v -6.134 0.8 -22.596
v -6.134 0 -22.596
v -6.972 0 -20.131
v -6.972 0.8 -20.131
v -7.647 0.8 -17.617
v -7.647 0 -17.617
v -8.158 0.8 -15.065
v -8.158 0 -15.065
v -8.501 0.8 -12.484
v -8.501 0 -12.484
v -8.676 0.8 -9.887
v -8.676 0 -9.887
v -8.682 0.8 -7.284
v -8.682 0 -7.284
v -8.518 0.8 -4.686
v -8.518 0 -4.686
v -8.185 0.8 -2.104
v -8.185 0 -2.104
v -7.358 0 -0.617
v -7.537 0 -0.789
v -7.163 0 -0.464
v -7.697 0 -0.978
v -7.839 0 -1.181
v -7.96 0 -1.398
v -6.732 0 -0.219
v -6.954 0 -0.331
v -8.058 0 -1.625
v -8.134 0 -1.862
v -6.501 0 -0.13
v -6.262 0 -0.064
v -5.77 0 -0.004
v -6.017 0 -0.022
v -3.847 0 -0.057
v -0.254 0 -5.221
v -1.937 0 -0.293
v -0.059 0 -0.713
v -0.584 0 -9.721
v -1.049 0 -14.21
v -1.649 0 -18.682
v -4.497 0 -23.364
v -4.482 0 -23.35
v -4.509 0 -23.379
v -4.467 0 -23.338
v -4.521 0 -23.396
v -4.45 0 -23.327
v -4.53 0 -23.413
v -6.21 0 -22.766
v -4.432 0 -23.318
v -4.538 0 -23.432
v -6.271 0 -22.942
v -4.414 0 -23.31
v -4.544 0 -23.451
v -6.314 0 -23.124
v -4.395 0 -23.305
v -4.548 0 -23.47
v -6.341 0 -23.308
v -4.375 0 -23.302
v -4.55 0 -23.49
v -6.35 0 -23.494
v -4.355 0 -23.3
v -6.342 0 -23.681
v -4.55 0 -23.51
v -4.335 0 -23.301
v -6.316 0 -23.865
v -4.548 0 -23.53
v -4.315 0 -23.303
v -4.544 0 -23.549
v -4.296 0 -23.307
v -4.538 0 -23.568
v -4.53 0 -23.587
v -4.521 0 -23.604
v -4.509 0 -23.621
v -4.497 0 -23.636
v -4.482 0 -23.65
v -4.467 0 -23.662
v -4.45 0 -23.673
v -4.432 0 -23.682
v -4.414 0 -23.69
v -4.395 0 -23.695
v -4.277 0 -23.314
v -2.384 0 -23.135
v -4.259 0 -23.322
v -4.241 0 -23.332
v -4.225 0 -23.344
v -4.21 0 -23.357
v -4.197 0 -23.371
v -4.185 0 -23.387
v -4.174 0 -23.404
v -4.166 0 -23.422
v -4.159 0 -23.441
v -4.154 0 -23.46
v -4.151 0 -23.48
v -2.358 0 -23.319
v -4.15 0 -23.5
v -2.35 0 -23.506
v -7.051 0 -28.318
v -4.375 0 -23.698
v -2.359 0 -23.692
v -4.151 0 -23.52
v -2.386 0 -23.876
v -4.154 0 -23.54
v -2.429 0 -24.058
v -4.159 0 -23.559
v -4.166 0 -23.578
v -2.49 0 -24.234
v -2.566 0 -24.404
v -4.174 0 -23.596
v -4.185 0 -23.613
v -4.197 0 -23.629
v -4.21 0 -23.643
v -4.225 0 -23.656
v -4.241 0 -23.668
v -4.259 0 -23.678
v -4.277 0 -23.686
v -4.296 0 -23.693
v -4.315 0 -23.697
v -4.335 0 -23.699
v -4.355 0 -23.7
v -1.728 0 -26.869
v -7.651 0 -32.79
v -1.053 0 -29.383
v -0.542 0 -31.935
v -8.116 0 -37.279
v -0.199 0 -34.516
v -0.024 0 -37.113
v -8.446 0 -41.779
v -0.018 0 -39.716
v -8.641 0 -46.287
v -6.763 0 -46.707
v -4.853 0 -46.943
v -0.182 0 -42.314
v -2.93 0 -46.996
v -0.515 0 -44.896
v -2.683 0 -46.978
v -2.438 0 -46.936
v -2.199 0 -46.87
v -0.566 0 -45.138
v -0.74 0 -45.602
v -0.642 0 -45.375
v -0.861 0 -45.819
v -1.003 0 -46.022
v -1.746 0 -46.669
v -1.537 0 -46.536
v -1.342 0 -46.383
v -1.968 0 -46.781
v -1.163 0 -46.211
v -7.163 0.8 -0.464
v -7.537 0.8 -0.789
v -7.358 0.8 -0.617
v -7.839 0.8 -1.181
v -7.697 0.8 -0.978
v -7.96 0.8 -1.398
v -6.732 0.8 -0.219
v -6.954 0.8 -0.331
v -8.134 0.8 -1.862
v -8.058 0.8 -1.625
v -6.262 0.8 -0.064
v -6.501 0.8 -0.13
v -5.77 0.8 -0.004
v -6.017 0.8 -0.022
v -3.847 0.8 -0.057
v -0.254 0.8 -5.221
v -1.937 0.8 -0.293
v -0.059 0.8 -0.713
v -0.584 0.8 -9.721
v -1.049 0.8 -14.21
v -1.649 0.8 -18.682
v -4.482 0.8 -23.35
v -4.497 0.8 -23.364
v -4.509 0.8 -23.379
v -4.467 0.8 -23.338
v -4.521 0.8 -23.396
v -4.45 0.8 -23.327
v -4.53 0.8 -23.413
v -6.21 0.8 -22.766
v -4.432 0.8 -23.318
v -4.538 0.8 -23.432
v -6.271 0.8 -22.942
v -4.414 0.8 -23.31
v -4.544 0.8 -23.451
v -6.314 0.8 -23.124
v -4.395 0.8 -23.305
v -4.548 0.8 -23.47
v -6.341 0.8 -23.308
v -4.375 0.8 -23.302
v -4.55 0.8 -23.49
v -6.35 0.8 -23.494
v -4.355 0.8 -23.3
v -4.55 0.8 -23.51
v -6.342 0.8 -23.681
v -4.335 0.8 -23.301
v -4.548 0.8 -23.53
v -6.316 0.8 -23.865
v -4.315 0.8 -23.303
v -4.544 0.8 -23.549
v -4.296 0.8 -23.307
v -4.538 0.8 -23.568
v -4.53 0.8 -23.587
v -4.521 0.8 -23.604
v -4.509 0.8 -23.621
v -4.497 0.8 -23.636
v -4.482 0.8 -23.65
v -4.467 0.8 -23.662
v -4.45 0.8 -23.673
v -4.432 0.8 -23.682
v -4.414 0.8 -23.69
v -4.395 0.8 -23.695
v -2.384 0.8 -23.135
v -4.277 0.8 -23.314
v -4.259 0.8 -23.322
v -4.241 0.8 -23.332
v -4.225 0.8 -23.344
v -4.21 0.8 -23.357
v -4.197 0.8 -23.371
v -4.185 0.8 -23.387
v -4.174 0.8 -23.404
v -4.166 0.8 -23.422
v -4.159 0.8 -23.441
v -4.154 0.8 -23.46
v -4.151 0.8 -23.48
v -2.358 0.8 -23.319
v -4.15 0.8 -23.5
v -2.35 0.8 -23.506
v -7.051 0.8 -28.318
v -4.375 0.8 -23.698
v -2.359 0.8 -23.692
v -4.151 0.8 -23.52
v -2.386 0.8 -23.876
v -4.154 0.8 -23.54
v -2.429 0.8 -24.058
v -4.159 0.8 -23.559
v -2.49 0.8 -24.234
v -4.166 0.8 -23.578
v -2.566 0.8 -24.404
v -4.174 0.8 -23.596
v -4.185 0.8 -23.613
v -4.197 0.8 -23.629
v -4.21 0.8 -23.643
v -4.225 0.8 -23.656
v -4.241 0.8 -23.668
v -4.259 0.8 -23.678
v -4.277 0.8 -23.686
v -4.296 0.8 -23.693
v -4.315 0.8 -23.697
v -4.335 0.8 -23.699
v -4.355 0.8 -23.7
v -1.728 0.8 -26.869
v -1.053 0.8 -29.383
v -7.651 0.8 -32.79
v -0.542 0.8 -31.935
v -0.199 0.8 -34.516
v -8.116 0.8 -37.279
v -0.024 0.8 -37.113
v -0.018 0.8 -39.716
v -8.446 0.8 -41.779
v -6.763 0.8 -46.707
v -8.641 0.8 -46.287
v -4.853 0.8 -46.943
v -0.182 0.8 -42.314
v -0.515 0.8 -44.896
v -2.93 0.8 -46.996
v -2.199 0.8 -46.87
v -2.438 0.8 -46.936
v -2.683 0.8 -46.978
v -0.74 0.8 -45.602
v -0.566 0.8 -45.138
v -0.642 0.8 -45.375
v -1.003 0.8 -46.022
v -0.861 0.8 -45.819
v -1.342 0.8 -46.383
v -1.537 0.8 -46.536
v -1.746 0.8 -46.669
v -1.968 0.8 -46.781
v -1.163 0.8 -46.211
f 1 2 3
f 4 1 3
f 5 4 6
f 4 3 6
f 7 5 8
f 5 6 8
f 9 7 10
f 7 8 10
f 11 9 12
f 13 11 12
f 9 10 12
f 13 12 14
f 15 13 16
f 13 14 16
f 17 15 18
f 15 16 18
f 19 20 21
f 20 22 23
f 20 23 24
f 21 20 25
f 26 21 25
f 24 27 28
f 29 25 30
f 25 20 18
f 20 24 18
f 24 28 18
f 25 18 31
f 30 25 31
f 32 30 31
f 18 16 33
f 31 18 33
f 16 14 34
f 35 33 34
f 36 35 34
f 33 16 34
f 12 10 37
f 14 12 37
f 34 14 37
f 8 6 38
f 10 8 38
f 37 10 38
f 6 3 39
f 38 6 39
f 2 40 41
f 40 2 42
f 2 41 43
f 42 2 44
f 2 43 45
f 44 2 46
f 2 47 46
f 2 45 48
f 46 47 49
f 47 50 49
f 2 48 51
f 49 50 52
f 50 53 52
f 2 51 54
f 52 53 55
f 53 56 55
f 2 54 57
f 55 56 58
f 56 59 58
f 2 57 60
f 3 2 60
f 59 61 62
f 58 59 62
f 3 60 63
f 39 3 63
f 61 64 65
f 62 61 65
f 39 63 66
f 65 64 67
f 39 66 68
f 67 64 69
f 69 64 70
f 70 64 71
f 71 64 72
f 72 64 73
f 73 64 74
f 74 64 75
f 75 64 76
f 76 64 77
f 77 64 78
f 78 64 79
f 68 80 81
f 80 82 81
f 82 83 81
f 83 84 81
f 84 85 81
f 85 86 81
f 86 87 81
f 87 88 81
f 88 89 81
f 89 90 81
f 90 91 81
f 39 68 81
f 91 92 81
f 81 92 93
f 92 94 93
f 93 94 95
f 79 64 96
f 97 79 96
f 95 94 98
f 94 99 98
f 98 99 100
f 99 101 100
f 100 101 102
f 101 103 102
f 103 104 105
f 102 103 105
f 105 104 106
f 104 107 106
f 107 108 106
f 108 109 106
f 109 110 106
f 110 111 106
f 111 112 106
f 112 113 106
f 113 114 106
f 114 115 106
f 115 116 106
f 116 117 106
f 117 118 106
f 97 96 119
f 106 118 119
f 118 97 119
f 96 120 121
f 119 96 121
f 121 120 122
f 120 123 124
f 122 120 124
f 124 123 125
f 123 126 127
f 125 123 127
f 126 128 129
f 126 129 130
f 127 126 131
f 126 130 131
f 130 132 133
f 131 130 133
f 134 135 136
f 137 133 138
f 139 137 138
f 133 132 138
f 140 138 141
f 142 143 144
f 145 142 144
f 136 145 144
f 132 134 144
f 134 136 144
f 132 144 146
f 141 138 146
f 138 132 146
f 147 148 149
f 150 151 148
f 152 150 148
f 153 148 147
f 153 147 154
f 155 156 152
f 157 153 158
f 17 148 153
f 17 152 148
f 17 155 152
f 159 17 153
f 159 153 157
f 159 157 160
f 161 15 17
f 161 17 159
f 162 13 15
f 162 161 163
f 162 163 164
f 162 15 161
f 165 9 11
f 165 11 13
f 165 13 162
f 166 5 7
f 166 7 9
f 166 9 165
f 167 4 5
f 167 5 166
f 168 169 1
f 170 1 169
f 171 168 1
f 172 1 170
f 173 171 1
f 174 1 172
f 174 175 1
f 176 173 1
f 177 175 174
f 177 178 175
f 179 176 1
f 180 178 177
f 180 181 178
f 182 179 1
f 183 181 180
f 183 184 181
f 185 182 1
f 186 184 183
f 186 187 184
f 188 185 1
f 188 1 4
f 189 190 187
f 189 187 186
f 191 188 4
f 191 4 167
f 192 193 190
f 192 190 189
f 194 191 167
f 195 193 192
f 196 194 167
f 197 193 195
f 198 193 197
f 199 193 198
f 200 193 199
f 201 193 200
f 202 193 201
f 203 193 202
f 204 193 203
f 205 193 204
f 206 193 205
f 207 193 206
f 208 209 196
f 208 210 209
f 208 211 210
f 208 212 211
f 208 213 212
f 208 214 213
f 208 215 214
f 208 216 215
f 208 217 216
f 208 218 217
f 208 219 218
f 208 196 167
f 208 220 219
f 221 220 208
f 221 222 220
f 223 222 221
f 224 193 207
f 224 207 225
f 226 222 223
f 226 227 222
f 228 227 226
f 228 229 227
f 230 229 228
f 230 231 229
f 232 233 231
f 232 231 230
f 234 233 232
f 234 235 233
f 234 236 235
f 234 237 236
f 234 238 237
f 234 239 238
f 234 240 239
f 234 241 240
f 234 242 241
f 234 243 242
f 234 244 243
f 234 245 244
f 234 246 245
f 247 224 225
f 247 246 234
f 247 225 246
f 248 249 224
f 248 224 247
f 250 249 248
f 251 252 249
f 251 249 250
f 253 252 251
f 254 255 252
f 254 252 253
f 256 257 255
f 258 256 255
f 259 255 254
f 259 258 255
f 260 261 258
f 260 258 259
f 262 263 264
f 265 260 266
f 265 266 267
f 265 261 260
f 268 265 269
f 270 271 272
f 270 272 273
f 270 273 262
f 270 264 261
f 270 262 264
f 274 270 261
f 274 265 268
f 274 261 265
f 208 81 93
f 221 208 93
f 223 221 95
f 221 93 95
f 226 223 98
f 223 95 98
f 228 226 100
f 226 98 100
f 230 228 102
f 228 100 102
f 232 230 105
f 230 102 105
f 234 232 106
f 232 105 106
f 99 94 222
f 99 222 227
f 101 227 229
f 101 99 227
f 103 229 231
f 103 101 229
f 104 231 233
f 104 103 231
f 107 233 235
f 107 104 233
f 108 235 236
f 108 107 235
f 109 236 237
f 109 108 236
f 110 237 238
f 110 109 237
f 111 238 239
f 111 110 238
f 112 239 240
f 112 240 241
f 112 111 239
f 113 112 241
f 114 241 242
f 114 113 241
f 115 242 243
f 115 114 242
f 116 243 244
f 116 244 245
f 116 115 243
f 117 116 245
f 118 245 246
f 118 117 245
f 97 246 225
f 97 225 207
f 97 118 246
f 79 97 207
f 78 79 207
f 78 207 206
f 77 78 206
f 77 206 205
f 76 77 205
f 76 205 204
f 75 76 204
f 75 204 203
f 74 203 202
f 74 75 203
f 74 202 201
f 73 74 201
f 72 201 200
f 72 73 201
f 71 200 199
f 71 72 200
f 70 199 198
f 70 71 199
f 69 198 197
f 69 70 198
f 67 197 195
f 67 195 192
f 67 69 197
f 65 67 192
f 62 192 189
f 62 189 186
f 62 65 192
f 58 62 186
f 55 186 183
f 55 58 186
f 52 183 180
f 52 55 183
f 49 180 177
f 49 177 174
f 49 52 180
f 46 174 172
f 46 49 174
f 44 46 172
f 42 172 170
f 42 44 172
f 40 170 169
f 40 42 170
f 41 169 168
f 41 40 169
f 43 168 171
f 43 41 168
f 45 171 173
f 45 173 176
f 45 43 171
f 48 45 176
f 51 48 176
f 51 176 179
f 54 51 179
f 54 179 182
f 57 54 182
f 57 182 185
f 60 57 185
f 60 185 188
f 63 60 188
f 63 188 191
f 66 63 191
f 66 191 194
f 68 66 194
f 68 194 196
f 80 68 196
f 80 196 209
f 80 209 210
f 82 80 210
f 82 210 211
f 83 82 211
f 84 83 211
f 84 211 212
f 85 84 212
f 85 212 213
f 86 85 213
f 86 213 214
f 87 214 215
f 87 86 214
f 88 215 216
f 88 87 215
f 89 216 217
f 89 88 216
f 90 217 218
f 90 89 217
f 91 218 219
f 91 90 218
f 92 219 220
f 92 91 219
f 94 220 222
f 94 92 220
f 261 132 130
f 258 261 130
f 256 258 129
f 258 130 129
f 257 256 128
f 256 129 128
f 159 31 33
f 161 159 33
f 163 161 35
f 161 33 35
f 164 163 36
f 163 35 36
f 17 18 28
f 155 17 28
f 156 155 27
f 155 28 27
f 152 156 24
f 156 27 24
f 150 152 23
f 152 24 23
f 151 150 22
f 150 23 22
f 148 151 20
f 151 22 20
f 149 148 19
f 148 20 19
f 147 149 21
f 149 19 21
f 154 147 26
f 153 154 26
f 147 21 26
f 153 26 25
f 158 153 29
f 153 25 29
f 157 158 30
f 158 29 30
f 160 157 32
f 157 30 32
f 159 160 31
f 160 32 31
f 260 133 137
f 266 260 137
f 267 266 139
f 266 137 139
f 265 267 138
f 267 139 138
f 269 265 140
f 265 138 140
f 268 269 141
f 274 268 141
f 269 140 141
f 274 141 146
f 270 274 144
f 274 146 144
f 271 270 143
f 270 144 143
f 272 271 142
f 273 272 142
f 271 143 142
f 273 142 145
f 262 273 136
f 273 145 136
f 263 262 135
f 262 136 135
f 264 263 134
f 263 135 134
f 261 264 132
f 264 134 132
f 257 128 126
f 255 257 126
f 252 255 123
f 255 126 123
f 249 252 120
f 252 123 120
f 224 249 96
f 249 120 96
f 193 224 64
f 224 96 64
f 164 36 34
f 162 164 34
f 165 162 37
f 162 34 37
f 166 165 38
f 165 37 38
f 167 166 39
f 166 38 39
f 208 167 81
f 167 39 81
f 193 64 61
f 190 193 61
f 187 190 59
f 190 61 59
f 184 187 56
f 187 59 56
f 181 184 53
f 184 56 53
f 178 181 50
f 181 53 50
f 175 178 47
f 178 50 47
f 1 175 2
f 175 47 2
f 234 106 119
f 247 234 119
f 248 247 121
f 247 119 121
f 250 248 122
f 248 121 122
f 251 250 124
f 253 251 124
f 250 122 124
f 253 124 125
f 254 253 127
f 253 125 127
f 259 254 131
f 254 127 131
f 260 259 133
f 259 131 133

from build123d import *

# Parameters (mm, degrees)
SKETCH1_R           = 0.2
BOSS_EXTRUDE1_DEPTH = 0.8


with BuildPart() as part:
    # Sketch1 → Boss-Extrude1 (new body)
    with BuildSketch(Plane(origin=(0, 0, 0), x_dir=(1, 0, 0), z_dir=(0, 1, 0))):
        with BuildLine():
            ThreePointArc((-2.383636789, 23.134738828), (-2.370326041, 23.784413457), (-2.565996752, 24.404064385))
            ThreePointArc((-2.565996752, 24.404064385), (-0.19892847, 34.515692649), (-0.514652369, 44.895883246))
            ThreePointArc((-0.514652369, 44.895883246), (-1.342299158, 46.382879838), (-2.929984682, 46.995589192))
            ThreePointArc((-2.929984682, 46.995589192), (-5.811012003, 46.848007958), (-8.640837363, 46.287484025))
            ThreePointArc((-8.640837363, 46.287484025), (-7.900405237, 35.032644788), (-6.316363211, 23.865261172))
            ThreePointArc((-6.316363211, 23.865261172), (-6.329673959, 23.215586543), (-6.134003248, 22.595935615))
            ThreePointArc((-6.134003248, 22.595935615), (-8.50107153, 12.484307351), (-8.185347631, 2.104116754))
            ThreePointArc((-8.185347631, 2.104116754), (-7.357700842, 0.617120162), (-5.770015318, 0.004410808))
            ThreePointArc((-5.770015318, 0.004410808), (-2.888987997, 0.151992042), (-0.059162637, 0.712515975))
            ThreePointArc((-0.059162637, 0.712515975), (-0.799594763, 11.967355212), (-2.383636789, 23.134738828))
        make_face()
        with Locations((-4.35, 23.5)):
            Circle(SKETCH1_R, mode=Mode.SUBTRACT)
    extrude(amount=BOSS_EXTRUDE1_DEPTH)


solid = part.part
